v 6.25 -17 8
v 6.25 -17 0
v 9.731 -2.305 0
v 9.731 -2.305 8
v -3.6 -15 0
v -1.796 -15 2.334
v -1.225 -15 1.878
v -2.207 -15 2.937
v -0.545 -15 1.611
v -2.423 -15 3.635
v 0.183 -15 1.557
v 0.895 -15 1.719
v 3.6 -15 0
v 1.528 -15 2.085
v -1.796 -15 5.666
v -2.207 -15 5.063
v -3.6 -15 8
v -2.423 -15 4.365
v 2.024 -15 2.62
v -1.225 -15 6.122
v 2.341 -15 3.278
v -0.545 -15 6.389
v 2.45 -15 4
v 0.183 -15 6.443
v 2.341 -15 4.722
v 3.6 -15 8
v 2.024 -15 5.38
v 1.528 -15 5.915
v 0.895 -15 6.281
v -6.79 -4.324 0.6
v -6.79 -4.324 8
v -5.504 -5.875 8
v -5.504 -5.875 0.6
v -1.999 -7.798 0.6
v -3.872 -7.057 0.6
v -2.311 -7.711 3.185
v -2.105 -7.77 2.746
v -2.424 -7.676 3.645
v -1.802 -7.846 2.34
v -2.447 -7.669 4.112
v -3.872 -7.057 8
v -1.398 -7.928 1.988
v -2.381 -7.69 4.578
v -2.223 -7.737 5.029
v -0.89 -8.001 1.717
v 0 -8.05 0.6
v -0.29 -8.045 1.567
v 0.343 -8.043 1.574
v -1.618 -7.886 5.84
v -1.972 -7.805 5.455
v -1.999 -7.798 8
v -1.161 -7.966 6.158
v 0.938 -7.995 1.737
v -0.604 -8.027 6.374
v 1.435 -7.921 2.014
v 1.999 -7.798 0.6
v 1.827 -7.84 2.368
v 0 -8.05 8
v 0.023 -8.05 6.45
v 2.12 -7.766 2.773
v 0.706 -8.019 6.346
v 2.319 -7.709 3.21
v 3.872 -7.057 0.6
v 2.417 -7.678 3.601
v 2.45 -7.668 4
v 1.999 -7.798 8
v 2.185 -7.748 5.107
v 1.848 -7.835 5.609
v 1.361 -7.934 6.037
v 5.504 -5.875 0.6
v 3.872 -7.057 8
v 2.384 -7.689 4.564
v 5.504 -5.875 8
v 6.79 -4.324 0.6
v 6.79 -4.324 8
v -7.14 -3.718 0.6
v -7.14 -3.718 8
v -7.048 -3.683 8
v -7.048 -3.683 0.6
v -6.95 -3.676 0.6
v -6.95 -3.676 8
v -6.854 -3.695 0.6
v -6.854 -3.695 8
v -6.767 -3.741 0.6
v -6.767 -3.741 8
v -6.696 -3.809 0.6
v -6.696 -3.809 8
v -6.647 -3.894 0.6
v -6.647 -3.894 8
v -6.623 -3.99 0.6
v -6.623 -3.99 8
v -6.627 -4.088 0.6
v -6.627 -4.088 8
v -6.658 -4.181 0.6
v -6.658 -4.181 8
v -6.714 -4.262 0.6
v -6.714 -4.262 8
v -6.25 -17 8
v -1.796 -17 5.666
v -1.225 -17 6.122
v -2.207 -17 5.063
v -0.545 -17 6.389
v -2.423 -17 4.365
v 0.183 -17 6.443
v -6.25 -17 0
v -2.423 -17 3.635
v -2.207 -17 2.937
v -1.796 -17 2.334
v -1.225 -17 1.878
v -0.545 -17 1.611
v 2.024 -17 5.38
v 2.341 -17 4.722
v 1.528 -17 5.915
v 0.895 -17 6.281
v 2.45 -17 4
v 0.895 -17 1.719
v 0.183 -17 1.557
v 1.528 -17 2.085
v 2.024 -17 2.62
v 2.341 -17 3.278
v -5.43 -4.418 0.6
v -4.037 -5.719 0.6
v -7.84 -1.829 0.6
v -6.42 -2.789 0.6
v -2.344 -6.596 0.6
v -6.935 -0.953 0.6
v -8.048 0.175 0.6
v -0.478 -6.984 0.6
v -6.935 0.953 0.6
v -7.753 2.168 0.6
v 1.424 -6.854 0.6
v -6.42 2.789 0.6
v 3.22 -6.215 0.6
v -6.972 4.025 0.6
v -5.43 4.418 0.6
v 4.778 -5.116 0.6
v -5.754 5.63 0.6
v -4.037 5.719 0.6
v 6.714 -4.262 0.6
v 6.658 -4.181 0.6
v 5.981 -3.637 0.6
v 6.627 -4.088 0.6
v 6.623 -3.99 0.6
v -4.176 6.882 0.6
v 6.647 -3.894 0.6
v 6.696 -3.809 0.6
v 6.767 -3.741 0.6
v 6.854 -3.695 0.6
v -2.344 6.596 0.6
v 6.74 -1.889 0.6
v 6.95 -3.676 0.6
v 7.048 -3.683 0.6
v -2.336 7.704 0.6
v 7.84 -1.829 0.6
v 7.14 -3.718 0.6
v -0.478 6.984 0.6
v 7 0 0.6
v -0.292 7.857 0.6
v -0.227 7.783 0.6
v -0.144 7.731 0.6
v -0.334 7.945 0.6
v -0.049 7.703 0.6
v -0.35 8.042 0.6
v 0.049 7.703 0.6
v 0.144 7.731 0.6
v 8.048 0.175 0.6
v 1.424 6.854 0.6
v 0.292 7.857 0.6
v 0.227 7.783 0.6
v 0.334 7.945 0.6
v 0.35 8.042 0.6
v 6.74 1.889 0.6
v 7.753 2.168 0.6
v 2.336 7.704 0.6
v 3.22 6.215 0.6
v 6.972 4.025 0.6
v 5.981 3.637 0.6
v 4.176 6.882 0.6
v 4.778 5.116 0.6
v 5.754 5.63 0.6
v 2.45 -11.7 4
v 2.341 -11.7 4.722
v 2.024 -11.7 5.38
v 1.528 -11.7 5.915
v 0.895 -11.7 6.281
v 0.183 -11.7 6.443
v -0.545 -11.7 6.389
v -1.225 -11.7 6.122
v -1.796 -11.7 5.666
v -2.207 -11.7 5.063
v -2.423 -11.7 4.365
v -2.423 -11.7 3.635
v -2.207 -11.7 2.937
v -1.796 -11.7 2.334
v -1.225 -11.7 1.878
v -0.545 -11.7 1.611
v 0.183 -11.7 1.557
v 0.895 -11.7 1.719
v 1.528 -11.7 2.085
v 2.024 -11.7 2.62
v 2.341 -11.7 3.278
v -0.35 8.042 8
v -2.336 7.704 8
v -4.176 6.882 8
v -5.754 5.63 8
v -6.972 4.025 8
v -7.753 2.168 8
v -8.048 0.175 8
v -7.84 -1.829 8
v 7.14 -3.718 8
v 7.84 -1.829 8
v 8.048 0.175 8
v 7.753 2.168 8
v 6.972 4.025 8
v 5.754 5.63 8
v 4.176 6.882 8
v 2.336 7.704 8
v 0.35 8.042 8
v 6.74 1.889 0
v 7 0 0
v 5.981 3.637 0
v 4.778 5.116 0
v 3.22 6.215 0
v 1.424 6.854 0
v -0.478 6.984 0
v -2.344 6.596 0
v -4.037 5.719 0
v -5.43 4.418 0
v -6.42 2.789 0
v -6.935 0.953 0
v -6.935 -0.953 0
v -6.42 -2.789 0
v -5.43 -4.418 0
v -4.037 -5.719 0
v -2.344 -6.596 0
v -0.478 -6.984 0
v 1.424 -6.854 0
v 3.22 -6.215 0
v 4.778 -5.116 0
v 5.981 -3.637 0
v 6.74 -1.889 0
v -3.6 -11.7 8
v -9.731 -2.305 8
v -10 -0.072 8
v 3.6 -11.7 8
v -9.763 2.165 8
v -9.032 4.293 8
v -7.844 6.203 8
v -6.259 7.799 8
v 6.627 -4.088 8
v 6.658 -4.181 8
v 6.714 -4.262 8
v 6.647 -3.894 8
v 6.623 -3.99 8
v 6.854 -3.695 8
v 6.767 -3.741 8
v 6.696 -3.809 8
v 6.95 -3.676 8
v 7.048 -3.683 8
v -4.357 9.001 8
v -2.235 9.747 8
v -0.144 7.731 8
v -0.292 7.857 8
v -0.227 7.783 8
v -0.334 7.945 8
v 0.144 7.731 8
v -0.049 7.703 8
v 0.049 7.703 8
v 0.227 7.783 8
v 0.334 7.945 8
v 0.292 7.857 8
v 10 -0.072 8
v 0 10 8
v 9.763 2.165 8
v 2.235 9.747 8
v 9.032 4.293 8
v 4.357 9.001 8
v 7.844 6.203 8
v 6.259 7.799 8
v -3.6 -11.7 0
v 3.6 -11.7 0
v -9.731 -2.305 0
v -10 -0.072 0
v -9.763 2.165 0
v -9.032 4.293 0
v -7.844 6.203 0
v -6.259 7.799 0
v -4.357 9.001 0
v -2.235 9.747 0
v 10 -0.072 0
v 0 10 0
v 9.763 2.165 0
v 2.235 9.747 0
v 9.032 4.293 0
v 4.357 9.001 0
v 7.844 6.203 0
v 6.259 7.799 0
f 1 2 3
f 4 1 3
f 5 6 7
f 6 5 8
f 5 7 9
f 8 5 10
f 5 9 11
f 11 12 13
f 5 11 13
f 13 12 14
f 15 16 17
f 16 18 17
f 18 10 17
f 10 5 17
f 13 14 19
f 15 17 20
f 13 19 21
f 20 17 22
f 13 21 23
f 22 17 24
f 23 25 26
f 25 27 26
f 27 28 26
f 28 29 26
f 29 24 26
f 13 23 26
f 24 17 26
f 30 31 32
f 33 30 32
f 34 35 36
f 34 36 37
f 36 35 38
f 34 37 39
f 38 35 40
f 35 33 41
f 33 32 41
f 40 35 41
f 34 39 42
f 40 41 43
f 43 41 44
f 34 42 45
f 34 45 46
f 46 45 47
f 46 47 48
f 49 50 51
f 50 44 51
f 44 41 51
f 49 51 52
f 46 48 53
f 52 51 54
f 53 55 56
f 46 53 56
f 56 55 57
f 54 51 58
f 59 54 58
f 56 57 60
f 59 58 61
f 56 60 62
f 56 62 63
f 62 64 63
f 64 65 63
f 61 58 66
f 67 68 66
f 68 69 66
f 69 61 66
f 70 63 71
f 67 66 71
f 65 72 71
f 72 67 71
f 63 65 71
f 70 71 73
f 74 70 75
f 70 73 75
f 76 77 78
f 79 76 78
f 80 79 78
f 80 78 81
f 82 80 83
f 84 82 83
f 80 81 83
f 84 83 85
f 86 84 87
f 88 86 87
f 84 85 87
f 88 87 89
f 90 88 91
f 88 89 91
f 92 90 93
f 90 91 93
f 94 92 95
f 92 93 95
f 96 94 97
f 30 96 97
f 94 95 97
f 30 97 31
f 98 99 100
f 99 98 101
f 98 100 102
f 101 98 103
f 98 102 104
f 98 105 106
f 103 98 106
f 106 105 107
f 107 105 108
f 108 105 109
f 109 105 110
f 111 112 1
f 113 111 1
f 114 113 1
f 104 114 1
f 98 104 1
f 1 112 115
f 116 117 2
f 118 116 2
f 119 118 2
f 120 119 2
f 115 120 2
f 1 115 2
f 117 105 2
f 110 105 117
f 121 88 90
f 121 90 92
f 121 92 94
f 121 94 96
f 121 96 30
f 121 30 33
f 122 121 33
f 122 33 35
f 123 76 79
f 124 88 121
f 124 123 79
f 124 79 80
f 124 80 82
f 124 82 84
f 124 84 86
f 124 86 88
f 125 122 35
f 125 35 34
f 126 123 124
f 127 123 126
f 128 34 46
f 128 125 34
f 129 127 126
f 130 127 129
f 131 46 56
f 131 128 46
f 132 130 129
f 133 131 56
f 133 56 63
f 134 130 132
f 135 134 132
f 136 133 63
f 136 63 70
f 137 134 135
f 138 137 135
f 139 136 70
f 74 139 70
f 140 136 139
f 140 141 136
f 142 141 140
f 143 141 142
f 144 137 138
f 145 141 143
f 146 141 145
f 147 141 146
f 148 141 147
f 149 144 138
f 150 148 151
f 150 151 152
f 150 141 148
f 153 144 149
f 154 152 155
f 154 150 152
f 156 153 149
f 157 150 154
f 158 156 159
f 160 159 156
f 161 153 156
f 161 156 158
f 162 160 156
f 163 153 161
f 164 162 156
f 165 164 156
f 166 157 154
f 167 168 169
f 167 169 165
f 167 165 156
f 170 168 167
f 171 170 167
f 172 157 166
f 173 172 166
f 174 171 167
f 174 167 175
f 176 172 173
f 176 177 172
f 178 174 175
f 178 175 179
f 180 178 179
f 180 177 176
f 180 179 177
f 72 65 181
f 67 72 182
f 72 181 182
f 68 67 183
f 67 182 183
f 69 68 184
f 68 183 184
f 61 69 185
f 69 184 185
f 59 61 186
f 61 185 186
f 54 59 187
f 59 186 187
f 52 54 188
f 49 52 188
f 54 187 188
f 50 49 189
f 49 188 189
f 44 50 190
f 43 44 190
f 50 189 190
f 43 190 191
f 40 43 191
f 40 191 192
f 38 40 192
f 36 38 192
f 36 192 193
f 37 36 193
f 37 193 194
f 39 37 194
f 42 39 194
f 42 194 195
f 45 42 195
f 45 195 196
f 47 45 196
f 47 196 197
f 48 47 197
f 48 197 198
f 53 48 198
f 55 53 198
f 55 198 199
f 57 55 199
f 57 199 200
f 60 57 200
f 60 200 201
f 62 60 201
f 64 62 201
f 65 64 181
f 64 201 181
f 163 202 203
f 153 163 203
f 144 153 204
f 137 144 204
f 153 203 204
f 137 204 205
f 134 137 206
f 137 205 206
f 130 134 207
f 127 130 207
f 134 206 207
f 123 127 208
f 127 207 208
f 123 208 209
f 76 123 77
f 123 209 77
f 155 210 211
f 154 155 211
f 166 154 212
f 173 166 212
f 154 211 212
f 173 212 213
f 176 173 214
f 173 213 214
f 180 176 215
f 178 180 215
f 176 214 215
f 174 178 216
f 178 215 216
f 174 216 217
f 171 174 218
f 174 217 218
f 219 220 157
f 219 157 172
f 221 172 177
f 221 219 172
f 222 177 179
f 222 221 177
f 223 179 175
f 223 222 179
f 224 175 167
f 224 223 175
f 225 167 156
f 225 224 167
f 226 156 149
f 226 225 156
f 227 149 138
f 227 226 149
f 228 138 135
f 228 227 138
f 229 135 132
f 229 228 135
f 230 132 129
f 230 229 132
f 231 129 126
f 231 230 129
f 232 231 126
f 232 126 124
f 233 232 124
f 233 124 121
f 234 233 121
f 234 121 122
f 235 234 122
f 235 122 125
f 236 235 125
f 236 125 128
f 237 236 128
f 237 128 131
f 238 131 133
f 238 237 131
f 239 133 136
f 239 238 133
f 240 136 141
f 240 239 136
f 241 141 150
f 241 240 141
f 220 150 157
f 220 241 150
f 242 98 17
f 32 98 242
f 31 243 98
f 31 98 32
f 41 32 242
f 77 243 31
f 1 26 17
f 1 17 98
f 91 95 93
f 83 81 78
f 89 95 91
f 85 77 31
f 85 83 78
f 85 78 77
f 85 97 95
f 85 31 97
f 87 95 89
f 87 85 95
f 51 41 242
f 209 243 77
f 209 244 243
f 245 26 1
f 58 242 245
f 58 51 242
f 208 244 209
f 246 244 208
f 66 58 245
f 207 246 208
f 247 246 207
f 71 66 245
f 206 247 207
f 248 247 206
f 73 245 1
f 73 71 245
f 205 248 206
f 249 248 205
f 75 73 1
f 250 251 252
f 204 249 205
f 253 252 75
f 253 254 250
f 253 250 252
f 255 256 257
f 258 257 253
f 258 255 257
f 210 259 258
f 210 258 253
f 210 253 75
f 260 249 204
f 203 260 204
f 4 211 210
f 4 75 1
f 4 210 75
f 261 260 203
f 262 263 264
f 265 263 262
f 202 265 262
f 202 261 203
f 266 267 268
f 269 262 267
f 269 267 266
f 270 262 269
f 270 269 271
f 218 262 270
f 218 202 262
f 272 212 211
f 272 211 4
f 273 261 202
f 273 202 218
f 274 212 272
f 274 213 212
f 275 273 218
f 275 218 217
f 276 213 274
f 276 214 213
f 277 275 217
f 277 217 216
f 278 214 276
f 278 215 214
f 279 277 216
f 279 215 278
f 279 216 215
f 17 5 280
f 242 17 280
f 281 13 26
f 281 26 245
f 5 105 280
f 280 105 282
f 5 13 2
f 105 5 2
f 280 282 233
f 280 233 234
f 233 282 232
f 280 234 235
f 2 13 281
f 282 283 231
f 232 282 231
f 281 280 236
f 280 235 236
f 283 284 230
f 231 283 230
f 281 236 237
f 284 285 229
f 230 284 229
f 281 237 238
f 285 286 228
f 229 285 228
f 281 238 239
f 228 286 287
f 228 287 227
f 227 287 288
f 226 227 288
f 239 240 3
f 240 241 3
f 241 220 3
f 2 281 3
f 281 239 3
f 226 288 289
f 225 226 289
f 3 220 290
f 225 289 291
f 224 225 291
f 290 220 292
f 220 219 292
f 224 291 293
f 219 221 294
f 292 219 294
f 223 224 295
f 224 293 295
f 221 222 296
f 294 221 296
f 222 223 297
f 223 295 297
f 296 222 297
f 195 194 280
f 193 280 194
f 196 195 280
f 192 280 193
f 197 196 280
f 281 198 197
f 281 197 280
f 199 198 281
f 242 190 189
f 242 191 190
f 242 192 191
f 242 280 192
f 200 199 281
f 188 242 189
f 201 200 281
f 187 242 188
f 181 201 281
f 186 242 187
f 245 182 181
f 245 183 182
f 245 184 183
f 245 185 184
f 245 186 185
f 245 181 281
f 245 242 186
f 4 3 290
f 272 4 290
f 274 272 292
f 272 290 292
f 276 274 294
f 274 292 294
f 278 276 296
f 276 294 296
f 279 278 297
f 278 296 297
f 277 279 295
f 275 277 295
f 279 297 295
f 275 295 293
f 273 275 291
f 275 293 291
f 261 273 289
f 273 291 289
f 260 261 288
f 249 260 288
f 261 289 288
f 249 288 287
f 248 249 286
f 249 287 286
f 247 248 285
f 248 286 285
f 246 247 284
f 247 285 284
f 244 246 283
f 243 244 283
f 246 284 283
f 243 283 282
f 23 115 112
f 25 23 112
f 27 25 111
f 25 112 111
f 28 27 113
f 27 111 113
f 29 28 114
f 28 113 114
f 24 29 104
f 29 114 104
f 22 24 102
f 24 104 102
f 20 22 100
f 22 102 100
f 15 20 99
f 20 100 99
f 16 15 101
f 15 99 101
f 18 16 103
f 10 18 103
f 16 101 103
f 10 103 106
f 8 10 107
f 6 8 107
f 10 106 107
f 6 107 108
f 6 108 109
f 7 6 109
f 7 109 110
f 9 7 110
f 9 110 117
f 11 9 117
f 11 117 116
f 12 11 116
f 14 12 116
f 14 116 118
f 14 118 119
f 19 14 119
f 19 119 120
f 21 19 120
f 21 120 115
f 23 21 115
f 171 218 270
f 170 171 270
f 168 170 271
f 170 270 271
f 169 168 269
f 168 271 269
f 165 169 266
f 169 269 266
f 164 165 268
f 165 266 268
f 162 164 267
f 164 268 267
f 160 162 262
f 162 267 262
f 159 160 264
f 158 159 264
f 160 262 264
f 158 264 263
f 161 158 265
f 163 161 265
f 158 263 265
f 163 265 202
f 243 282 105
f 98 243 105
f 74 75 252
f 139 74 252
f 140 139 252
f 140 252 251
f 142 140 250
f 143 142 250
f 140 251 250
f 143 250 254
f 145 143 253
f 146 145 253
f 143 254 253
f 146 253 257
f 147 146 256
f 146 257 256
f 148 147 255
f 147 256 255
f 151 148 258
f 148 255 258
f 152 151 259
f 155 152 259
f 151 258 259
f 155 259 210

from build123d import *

# Parameters (mm, degrees)
F0_R     = 7
F1_DEPTH = 8
F3_DEPTH = 7.4
F4_R     = 2.45
F5_DEPTH = 12
F6_W     = 7.2
F6_H     = 3.3
F7_DEPTH = 8.001


with BuildPart() as f1:
    # F0 (on Top) → F1 (new body)
    with BuildSketch(Plane.XY):
        with BuildLine():
            Line((6.25, -17), (9.730754, -2.30487))
            ThreePointArc((9.730754, -2.30487), (0, 10), (-9.730754, -2.30487))
            Line((-9.730754, -2.30487), (-6.25, -17))
            Line((-6.25, -17), (6.25, -17))
        make_face()
        Circle(F0_R, mode=Mode.SUBTRACT)
    extrude(amount=F1_DEPTH)

    # F2 (on face) → F3 (cut)
    with BuildSketch(Plane.XY.offset(8)):
        with BuildLine():
            ThreePointArc((0.349917, 8.042391), (0, 7.7), (-0.349917, 8.042391))
            ThreePointArc((-0.349917, 8.042391), (-6.971505, 4.025), (-7.139874, -3.718158))
            ThreePointArc((-7.139874, -3.718158), (-6.668396, -3.85), (-6.789957, -4.324233))
            ThreePointArc((-6.789957, -4.324233), (0, -8.05), (6.789957, -4.324233))
            ThreePointArc((6.789957, -4.324233), (6.668396, -3.85), (7.139874, -3.718158))
            ThreePointArc((7.139874, -3.718158), (6.971505, 4.025), (0.349917, 8.042391))
        make_face()
    extrude(amount=-F3_DEPTH, mode=Mode.SUBTRACT)

    # F4 (on face) → F5 (cut)
    with BuildSketch(Plane.XZ.offset(17)):
        with Locations((0, 4)):
            Circle(F4_R)
    extrude(amount=-F5_DEPTH, mode=Mode.SUBTRACT)

    # F6 (on face) → F7 (cut, through all)
    with BuildSketch(Plane.XY.offset(8)):
        with Locations((0, -13.35)):
            Rectangle(F6_W, F6_H)
    extrude(amount=-F7_DEPTH, mode=Mode.SUBTRACT)


solid = f1.part
